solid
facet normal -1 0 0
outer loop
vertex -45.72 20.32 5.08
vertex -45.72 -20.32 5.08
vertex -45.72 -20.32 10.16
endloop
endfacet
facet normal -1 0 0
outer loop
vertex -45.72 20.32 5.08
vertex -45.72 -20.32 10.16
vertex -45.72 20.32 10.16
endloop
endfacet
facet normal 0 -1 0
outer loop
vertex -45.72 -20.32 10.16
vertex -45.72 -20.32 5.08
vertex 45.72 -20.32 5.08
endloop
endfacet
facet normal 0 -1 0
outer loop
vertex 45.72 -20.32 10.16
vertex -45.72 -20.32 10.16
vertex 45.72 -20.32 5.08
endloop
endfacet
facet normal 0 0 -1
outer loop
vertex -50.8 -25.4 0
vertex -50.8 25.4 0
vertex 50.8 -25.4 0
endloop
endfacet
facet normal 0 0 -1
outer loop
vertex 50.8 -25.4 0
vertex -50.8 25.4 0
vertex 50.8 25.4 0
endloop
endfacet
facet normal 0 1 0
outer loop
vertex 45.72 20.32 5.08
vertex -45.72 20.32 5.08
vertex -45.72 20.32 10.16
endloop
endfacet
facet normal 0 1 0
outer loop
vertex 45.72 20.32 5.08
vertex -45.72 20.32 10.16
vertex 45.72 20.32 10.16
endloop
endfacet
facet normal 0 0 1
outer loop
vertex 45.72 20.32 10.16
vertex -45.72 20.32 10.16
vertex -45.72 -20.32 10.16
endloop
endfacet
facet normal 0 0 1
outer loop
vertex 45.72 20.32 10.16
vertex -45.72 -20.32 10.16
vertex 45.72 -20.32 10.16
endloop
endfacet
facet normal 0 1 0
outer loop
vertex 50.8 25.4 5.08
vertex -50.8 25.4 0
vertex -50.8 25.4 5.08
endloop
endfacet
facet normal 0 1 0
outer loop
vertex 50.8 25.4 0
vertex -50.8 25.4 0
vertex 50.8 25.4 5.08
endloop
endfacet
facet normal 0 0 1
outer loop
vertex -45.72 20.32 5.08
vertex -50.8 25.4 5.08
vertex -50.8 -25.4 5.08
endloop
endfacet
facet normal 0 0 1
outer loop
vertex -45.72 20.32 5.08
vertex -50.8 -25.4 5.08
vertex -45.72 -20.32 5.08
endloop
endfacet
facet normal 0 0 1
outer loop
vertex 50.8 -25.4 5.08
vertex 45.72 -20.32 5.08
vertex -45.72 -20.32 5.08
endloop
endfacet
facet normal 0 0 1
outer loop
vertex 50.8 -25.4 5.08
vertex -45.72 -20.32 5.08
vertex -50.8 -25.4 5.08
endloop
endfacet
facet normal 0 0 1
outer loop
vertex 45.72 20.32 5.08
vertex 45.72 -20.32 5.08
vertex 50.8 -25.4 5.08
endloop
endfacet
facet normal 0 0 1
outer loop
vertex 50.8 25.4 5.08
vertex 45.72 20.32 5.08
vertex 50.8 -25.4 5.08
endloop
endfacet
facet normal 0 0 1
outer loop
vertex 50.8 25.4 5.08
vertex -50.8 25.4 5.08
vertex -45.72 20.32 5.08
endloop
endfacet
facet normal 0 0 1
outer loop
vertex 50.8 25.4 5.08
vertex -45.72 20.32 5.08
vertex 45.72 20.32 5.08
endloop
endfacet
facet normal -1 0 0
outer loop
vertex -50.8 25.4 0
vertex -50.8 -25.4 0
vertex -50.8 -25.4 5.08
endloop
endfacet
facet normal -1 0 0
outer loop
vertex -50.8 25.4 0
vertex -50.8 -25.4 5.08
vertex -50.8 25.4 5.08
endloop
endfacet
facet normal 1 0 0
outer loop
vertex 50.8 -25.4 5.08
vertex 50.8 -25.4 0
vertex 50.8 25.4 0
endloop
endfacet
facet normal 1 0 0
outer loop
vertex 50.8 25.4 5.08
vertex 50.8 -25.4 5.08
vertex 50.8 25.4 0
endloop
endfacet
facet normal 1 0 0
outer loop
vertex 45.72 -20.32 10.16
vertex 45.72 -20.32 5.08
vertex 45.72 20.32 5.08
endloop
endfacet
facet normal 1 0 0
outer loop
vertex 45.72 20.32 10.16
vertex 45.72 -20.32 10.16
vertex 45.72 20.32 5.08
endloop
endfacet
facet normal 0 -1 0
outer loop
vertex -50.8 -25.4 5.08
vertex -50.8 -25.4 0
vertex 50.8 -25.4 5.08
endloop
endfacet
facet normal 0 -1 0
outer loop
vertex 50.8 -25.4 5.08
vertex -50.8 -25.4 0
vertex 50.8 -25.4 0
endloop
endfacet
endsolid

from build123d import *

# Parameters (mm, degrees)
F0_W     = 91.44
F0_H     = 40.64
F1_DEPTH = 5.08
F0_W_2   = 101.6
F0_H_2   = 50.8
F2_DEPTH = 5.08
F3_DEPTH = 10.16


with BuildPart() as f1:
    # F0 (on Top) → F1 (new body)
    with BuildSketch(Plane.XY):
        Rectangle(F0_W, F0_H)
    extrude(amount=F1_DEPTH)

    # F0 (on Top) → F2 (join)
    with BuildSketch(Plane.XY):
        Rectangle(F0_W_2, F0_H_2)
        Rectangle(F0_W, F0_H, mode=Mode.SUBTRACT)
    extrude(amount=F2_DEPTH)

    # F0 (on Top) → F3 (join)
    with BuildSketch(Plane.XY):
        Rectangle(F0_W, F0_H)
    extrude(amount=F3_DEPTH)


solid = f1.part
